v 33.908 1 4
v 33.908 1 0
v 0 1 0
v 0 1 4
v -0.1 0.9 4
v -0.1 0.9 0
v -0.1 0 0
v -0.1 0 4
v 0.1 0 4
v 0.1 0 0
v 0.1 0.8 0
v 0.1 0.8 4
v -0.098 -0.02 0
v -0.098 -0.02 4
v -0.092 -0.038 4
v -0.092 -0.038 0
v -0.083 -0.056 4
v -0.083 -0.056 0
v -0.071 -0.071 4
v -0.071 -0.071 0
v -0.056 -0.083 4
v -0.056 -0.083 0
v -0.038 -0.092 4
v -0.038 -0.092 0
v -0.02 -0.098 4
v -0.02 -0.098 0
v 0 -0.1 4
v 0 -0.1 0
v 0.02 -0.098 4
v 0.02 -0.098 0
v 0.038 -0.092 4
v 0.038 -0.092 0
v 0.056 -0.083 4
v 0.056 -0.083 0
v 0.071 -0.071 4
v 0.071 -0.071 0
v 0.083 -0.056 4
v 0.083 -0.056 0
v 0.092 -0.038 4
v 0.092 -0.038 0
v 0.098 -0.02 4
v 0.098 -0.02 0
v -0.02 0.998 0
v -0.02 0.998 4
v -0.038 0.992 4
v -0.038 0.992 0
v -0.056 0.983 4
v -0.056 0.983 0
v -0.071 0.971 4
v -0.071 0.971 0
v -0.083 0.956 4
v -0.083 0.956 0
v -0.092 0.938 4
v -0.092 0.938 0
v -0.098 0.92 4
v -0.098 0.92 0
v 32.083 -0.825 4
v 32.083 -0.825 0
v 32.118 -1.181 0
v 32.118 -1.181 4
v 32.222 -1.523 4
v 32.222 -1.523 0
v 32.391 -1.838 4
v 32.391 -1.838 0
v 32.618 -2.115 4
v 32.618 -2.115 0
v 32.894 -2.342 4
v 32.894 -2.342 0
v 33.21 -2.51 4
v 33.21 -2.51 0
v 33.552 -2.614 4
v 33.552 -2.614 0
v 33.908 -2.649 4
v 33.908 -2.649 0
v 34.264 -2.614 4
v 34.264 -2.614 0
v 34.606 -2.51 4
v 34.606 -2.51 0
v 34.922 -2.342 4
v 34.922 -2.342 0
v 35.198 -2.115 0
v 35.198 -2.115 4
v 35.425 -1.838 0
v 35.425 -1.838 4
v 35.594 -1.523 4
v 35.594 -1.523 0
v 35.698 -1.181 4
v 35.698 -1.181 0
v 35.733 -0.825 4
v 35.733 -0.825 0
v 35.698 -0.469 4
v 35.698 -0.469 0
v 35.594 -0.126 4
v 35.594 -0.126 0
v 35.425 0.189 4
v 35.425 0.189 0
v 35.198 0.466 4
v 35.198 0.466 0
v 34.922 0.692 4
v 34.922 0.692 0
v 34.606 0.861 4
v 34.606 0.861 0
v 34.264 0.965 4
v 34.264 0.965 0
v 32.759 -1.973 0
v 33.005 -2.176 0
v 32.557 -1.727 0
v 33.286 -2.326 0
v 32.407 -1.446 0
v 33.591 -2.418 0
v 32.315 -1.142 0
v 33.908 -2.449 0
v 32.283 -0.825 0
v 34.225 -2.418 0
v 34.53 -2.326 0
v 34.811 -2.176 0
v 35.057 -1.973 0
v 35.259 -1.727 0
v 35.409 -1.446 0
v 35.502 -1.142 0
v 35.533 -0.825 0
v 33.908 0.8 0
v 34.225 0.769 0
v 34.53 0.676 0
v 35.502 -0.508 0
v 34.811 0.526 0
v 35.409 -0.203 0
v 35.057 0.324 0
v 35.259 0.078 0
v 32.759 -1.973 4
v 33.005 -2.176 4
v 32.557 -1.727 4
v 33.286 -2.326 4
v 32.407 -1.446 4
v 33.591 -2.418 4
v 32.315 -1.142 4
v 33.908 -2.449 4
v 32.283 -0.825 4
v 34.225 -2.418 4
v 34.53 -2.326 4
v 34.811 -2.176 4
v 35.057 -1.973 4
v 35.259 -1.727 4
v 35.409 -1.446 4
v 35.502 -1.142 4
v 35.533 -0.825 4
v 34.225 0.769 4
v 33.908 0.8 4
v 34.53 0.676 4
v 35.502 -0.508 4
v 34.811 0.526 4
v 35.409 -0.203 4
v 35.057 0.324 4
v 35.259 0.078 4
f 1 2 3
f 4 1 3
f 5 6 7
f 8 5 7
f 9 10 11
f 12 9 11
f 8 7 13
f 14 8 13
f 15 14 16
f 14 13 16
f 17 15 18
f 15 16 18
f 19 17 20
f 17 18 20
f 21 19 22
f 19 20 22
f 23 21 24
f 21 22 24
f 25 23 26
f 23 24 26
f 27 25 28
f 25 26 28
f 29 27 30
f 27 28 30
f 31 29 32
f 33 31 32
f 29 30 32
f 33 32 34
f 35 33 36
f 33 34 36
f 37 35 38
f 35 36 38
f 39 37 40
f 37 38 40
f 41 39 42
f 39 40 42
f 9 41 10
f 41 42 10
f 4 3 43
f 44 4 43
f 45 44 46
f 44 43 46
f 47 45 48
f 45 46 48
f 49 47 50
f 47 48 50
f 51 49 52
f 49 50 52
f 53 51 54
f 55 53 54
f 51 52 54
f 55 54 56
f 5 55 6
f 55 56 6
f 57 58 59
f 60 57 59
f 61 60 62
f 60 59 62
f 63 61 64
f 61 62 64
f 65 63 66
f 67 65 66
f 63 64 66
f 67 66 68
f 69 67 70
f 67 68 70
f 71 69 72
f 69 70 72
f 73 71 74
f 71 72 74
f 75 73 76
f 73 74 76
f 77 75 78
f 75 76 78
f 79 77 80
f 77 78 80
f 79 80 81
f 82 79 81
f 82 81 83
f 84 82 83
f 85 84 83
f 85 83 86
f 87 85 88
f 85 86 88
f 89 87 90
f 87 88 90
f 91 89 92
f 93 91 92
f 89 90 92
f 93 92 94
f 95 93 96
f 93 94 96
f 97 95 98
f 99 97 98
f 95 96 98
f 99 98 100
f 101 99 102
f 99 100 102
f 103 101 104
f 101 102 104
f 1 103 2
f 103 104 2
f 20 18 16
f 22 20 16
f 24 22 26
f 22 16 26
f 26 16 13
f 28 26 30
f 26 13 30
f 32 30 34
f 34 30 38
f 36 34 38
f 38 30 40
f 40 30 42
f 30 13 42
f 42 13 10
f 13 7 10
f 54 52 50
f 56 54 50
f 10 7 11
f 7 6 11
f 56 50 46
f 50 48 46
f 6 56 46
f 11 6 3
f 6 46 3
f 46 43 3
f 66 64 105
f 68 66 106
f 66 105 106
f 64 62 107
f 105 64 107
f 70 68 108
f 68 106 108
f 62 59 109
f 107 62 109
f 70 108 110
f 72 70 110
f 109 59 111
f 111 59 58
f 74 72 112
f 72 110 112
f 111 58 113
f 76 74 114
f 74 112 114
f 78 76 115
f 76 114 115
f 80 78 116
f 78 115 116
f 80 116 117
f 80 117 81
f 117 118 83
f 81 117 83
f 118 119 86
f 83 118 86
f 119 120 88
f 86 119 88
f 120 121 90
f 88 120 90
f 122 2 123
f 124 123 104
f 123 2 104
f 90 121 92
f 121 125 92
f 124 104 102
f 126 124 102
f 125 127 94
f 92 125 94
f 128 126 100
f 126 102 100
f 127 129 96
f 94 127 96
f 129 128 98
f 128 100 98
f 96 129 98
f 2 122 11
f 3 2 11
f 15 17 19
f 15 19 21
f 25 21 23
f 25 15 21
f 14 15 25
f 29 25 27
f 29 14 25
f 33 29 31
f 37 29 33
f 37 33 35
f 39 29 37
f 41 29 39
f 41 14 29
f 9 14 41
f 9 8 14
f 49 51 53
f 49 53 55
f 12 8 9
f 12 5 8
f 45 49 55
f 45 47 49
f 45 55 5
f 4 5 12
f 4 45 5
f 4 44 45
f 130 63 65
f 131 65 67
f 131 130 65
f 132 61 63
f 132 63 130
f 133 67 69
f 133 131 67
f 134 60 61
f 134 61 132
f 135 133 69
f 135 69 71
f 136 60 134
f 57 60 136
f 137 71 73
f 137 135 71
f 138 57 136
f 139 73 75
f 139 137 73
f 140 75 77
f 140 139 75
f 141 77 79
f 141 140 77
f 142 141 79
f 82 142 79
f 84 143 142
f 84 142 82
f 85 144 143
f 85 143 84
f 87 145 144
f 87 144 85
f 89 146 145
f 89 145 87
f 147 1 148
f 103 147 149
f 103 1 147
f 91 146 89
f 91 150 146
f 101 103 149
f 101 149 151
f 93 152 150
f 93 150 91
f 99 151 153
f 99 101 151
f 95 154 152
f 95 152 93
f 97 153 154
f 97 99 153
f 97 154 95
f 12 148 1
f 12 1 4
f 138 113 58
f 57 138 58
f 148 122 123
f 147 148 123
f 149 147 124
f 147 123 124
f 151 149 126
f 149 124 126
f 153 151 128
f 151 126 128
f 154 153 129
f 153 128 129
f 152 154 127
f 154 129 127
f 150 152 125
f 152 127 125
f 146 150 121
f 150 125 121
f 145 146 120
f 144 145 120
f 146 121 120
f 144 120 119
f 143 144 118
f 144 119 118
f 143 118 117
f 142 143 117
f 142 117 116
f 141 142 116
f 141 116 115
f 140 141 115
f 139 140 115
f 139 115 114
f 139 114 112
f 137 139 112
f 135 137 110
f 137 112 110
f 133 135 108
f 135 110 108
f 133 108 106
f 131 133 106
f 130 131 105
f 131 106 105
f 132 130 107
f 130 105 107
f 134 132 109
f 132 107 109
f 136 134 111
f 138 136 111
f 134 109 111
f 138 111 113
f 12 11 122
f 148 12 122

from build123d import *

# Parameters (mm, degrees)
RESSALTO_EXTRUS_O1_DEPTH = 4


with BuildPart() as part:
    # Esboço1 → Ressalto-extrusão1 (new body)
    with BuildSketch(Plane.XY):
        with BuildLine():
            Line((0.1, 0), (0.1, 0.8))
            Line((0.1, 0.8), (33.077498183, 0.8))
            Line((33.077498183, 0.8), (33.908082875, 0.8))
            ThreePointArc((33.908082875, 0.8), (35.05690323, -1.973497683), (32.283405548, -0.824677327))
            Line((32.283405548, -0.824677327), (32.083405548, -0.824677327))
            ThreePointArc((32.083405548, -0.824677327), (35.198324587, -2.114919039), (33.908082875, 1))
            Line((33.908082875, 1), (0, 1))
            ThreePointArc((0, 1), (-0.070710678, 0.970710678), (-0.1, 0.9))
            Line((-0.1, 0.9), (-0.1, 0.8))
            Line((-0.1, 0.8), (-0.1, 0))
            ThreePointArc((-0.1, 0), (0, -0.1), (0.1, 0))
        make_face()
    extrude(amount=RESSALTO_EXTRUS_O1_DEPTH)


solid = part.part
